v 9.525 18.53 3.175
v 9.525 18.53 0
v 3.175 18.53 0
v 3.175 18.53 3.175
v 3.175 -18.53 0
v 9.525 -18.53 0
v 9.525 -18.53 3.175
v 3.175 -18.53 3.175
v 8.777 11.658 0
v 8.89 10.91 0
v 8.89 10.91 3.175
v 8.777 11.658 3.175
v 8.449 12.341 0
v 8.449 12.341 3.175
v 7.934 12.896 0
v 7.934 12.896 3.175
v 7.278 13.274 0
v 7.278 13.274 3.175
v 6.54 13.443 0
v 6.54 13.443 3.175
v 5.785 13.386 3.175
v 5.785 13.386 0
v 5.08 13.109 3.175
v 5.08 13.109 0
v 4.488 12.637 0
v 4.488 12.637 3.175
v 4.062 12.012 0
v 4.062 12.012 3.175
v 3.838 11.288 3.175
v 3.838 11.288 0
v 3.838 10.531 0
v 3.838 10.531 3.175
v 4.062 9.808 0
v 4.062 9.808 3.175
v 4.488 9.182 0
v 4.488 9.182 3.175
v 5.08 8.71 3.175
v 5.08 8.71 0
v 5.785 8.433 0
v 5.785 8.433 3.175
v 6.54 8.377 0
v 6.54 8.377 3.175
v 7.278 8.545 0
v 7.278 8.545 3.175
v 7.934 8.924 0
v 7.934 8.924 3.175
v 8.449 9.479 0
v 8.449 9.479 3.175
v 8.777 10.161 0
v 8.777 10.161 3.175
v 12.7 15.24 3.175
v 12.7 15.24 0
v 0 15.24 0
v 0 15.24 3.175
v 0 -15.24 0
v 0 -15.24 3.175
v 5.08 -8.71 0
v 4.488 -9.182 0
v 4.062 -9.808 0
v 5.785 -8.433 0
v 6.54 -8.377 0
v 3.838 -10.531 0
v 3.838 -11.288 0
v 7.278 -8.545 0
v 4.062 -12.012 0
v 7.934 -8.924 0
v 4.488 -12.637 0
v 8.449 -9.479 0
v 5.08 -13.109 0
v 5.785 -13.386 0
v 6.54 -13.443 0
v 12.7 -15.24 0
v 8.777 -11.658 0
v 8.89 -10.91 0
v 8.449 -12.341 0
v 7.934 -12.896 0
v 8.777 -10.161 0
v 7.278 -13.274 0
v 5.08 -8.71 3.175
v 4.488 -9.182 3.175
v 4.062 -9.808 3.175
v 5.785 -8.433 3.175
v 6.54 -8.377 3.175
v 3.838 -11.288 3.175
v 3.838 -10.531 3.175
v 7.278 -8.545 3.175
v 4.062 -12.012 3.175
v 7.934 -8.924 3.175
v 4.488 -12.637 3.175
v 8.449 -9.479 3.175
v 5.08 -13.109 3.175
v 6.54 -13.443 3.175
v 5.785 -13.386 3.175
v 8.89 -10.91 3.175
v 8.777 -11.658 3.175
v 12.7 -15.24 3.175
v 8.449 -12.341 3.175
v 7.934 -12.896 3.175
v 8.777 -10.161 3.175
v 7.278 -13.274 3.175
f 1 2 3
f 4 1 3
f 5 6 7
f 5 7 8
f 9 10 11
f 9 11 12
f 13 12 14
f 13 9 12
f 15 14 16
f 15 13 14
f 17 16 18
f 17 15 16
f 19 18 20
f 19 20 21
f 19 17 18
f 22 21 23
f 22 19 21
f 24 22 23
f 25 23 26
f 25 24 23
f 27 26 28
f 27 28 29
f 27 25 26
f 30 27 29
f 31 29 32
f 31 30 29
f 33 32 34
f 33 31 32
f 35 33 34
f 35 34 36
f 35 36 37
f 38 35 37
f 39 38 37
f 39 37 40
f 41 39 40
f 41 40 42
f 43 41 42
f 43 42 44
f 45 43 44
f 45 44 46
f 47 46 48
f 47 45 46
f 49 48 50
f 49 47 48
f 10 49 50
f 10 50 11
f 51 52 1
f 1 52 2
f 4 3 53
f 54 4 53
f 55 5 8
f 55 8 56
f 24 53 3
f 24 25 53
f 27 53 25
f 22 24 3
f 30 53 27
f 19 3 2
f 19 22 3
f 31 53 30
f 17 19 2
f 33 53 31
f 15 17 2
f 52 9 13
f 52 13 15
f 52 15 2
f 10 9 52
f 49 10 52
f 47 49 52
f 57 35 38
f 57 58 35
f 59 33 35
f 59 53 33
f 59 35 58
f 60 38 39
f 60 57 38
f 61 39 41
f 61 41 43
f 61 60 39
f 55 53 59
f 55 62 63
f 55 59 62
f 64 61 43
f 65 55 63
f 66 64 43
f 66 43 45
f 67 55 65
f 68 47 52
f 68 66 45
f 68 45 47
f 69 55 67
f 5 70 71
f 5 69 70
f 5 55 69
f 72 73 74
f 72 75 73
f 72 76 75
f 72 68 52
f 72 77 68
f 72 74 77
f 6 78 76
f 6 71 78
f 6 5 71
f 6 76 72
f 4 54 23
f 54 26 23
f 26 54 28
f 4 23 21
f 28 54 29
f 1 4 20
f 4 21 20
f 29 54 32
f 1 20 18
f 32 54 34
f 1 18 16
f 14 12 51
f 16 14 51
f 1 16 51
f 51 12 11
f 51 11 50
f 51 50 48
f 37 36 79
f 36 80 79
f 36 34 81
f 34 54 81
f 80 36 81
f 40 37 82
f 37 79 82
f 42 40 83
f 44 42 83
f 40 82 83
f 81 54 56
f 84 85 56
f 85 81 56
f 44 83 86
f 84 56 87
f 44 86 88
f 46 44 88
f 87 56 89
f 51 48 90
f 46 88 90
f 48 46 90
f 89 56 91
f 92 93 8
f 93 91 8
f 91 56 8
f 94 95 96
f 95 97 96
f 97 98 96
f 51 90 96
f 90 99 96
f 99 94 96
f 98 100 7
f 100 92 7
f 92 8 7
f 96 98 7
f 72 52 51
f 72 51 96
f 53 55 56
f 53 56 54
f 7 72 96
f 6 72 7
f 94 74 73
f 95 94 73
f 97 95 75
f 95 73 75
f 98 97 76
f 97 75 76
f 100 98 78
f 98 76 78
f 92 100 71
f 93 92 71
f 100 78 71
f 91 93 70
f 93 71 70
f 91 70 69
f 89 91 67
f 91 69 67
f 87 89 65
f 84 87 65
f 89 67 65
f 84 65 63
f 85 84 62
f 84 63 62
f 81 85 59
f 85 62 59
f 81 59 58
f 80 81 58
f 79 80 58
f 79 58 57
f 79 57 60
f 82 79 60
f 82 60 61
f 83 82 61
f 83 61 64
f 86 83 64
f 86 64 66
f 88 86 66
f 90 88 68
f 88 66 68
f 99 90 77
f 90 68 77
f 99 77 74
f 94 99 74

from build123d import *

# Parameters (mm, degrees)
SKETCH4_R           = 2.54
BOSS_EXTRUDE1_DEPTH = 3.175


with BuildPart() as part:
    # Sketch4 → Boss-Extrude1 (new body)
    with BuildSketch(Plane.XY):
        Polygon((0, 0), (12.7, 0), (12.7, 15.24), (9.525, 18.529765797), (3.175, 18.529765797), (0, 15.24), align=None)
        with Locations((6.35, 10.909765797)):
            Circle(SKETCH4_R, mode=Mode.SUBTRACT)
    boss_extrude1 = extrude(amount=BOSS_EXTRUDE1_DEPTH)

    # Mirror1: Boss-Extrude1 across plane
    add(boss_extrude1.mirror(Plane.ZX))


solid = part.part
